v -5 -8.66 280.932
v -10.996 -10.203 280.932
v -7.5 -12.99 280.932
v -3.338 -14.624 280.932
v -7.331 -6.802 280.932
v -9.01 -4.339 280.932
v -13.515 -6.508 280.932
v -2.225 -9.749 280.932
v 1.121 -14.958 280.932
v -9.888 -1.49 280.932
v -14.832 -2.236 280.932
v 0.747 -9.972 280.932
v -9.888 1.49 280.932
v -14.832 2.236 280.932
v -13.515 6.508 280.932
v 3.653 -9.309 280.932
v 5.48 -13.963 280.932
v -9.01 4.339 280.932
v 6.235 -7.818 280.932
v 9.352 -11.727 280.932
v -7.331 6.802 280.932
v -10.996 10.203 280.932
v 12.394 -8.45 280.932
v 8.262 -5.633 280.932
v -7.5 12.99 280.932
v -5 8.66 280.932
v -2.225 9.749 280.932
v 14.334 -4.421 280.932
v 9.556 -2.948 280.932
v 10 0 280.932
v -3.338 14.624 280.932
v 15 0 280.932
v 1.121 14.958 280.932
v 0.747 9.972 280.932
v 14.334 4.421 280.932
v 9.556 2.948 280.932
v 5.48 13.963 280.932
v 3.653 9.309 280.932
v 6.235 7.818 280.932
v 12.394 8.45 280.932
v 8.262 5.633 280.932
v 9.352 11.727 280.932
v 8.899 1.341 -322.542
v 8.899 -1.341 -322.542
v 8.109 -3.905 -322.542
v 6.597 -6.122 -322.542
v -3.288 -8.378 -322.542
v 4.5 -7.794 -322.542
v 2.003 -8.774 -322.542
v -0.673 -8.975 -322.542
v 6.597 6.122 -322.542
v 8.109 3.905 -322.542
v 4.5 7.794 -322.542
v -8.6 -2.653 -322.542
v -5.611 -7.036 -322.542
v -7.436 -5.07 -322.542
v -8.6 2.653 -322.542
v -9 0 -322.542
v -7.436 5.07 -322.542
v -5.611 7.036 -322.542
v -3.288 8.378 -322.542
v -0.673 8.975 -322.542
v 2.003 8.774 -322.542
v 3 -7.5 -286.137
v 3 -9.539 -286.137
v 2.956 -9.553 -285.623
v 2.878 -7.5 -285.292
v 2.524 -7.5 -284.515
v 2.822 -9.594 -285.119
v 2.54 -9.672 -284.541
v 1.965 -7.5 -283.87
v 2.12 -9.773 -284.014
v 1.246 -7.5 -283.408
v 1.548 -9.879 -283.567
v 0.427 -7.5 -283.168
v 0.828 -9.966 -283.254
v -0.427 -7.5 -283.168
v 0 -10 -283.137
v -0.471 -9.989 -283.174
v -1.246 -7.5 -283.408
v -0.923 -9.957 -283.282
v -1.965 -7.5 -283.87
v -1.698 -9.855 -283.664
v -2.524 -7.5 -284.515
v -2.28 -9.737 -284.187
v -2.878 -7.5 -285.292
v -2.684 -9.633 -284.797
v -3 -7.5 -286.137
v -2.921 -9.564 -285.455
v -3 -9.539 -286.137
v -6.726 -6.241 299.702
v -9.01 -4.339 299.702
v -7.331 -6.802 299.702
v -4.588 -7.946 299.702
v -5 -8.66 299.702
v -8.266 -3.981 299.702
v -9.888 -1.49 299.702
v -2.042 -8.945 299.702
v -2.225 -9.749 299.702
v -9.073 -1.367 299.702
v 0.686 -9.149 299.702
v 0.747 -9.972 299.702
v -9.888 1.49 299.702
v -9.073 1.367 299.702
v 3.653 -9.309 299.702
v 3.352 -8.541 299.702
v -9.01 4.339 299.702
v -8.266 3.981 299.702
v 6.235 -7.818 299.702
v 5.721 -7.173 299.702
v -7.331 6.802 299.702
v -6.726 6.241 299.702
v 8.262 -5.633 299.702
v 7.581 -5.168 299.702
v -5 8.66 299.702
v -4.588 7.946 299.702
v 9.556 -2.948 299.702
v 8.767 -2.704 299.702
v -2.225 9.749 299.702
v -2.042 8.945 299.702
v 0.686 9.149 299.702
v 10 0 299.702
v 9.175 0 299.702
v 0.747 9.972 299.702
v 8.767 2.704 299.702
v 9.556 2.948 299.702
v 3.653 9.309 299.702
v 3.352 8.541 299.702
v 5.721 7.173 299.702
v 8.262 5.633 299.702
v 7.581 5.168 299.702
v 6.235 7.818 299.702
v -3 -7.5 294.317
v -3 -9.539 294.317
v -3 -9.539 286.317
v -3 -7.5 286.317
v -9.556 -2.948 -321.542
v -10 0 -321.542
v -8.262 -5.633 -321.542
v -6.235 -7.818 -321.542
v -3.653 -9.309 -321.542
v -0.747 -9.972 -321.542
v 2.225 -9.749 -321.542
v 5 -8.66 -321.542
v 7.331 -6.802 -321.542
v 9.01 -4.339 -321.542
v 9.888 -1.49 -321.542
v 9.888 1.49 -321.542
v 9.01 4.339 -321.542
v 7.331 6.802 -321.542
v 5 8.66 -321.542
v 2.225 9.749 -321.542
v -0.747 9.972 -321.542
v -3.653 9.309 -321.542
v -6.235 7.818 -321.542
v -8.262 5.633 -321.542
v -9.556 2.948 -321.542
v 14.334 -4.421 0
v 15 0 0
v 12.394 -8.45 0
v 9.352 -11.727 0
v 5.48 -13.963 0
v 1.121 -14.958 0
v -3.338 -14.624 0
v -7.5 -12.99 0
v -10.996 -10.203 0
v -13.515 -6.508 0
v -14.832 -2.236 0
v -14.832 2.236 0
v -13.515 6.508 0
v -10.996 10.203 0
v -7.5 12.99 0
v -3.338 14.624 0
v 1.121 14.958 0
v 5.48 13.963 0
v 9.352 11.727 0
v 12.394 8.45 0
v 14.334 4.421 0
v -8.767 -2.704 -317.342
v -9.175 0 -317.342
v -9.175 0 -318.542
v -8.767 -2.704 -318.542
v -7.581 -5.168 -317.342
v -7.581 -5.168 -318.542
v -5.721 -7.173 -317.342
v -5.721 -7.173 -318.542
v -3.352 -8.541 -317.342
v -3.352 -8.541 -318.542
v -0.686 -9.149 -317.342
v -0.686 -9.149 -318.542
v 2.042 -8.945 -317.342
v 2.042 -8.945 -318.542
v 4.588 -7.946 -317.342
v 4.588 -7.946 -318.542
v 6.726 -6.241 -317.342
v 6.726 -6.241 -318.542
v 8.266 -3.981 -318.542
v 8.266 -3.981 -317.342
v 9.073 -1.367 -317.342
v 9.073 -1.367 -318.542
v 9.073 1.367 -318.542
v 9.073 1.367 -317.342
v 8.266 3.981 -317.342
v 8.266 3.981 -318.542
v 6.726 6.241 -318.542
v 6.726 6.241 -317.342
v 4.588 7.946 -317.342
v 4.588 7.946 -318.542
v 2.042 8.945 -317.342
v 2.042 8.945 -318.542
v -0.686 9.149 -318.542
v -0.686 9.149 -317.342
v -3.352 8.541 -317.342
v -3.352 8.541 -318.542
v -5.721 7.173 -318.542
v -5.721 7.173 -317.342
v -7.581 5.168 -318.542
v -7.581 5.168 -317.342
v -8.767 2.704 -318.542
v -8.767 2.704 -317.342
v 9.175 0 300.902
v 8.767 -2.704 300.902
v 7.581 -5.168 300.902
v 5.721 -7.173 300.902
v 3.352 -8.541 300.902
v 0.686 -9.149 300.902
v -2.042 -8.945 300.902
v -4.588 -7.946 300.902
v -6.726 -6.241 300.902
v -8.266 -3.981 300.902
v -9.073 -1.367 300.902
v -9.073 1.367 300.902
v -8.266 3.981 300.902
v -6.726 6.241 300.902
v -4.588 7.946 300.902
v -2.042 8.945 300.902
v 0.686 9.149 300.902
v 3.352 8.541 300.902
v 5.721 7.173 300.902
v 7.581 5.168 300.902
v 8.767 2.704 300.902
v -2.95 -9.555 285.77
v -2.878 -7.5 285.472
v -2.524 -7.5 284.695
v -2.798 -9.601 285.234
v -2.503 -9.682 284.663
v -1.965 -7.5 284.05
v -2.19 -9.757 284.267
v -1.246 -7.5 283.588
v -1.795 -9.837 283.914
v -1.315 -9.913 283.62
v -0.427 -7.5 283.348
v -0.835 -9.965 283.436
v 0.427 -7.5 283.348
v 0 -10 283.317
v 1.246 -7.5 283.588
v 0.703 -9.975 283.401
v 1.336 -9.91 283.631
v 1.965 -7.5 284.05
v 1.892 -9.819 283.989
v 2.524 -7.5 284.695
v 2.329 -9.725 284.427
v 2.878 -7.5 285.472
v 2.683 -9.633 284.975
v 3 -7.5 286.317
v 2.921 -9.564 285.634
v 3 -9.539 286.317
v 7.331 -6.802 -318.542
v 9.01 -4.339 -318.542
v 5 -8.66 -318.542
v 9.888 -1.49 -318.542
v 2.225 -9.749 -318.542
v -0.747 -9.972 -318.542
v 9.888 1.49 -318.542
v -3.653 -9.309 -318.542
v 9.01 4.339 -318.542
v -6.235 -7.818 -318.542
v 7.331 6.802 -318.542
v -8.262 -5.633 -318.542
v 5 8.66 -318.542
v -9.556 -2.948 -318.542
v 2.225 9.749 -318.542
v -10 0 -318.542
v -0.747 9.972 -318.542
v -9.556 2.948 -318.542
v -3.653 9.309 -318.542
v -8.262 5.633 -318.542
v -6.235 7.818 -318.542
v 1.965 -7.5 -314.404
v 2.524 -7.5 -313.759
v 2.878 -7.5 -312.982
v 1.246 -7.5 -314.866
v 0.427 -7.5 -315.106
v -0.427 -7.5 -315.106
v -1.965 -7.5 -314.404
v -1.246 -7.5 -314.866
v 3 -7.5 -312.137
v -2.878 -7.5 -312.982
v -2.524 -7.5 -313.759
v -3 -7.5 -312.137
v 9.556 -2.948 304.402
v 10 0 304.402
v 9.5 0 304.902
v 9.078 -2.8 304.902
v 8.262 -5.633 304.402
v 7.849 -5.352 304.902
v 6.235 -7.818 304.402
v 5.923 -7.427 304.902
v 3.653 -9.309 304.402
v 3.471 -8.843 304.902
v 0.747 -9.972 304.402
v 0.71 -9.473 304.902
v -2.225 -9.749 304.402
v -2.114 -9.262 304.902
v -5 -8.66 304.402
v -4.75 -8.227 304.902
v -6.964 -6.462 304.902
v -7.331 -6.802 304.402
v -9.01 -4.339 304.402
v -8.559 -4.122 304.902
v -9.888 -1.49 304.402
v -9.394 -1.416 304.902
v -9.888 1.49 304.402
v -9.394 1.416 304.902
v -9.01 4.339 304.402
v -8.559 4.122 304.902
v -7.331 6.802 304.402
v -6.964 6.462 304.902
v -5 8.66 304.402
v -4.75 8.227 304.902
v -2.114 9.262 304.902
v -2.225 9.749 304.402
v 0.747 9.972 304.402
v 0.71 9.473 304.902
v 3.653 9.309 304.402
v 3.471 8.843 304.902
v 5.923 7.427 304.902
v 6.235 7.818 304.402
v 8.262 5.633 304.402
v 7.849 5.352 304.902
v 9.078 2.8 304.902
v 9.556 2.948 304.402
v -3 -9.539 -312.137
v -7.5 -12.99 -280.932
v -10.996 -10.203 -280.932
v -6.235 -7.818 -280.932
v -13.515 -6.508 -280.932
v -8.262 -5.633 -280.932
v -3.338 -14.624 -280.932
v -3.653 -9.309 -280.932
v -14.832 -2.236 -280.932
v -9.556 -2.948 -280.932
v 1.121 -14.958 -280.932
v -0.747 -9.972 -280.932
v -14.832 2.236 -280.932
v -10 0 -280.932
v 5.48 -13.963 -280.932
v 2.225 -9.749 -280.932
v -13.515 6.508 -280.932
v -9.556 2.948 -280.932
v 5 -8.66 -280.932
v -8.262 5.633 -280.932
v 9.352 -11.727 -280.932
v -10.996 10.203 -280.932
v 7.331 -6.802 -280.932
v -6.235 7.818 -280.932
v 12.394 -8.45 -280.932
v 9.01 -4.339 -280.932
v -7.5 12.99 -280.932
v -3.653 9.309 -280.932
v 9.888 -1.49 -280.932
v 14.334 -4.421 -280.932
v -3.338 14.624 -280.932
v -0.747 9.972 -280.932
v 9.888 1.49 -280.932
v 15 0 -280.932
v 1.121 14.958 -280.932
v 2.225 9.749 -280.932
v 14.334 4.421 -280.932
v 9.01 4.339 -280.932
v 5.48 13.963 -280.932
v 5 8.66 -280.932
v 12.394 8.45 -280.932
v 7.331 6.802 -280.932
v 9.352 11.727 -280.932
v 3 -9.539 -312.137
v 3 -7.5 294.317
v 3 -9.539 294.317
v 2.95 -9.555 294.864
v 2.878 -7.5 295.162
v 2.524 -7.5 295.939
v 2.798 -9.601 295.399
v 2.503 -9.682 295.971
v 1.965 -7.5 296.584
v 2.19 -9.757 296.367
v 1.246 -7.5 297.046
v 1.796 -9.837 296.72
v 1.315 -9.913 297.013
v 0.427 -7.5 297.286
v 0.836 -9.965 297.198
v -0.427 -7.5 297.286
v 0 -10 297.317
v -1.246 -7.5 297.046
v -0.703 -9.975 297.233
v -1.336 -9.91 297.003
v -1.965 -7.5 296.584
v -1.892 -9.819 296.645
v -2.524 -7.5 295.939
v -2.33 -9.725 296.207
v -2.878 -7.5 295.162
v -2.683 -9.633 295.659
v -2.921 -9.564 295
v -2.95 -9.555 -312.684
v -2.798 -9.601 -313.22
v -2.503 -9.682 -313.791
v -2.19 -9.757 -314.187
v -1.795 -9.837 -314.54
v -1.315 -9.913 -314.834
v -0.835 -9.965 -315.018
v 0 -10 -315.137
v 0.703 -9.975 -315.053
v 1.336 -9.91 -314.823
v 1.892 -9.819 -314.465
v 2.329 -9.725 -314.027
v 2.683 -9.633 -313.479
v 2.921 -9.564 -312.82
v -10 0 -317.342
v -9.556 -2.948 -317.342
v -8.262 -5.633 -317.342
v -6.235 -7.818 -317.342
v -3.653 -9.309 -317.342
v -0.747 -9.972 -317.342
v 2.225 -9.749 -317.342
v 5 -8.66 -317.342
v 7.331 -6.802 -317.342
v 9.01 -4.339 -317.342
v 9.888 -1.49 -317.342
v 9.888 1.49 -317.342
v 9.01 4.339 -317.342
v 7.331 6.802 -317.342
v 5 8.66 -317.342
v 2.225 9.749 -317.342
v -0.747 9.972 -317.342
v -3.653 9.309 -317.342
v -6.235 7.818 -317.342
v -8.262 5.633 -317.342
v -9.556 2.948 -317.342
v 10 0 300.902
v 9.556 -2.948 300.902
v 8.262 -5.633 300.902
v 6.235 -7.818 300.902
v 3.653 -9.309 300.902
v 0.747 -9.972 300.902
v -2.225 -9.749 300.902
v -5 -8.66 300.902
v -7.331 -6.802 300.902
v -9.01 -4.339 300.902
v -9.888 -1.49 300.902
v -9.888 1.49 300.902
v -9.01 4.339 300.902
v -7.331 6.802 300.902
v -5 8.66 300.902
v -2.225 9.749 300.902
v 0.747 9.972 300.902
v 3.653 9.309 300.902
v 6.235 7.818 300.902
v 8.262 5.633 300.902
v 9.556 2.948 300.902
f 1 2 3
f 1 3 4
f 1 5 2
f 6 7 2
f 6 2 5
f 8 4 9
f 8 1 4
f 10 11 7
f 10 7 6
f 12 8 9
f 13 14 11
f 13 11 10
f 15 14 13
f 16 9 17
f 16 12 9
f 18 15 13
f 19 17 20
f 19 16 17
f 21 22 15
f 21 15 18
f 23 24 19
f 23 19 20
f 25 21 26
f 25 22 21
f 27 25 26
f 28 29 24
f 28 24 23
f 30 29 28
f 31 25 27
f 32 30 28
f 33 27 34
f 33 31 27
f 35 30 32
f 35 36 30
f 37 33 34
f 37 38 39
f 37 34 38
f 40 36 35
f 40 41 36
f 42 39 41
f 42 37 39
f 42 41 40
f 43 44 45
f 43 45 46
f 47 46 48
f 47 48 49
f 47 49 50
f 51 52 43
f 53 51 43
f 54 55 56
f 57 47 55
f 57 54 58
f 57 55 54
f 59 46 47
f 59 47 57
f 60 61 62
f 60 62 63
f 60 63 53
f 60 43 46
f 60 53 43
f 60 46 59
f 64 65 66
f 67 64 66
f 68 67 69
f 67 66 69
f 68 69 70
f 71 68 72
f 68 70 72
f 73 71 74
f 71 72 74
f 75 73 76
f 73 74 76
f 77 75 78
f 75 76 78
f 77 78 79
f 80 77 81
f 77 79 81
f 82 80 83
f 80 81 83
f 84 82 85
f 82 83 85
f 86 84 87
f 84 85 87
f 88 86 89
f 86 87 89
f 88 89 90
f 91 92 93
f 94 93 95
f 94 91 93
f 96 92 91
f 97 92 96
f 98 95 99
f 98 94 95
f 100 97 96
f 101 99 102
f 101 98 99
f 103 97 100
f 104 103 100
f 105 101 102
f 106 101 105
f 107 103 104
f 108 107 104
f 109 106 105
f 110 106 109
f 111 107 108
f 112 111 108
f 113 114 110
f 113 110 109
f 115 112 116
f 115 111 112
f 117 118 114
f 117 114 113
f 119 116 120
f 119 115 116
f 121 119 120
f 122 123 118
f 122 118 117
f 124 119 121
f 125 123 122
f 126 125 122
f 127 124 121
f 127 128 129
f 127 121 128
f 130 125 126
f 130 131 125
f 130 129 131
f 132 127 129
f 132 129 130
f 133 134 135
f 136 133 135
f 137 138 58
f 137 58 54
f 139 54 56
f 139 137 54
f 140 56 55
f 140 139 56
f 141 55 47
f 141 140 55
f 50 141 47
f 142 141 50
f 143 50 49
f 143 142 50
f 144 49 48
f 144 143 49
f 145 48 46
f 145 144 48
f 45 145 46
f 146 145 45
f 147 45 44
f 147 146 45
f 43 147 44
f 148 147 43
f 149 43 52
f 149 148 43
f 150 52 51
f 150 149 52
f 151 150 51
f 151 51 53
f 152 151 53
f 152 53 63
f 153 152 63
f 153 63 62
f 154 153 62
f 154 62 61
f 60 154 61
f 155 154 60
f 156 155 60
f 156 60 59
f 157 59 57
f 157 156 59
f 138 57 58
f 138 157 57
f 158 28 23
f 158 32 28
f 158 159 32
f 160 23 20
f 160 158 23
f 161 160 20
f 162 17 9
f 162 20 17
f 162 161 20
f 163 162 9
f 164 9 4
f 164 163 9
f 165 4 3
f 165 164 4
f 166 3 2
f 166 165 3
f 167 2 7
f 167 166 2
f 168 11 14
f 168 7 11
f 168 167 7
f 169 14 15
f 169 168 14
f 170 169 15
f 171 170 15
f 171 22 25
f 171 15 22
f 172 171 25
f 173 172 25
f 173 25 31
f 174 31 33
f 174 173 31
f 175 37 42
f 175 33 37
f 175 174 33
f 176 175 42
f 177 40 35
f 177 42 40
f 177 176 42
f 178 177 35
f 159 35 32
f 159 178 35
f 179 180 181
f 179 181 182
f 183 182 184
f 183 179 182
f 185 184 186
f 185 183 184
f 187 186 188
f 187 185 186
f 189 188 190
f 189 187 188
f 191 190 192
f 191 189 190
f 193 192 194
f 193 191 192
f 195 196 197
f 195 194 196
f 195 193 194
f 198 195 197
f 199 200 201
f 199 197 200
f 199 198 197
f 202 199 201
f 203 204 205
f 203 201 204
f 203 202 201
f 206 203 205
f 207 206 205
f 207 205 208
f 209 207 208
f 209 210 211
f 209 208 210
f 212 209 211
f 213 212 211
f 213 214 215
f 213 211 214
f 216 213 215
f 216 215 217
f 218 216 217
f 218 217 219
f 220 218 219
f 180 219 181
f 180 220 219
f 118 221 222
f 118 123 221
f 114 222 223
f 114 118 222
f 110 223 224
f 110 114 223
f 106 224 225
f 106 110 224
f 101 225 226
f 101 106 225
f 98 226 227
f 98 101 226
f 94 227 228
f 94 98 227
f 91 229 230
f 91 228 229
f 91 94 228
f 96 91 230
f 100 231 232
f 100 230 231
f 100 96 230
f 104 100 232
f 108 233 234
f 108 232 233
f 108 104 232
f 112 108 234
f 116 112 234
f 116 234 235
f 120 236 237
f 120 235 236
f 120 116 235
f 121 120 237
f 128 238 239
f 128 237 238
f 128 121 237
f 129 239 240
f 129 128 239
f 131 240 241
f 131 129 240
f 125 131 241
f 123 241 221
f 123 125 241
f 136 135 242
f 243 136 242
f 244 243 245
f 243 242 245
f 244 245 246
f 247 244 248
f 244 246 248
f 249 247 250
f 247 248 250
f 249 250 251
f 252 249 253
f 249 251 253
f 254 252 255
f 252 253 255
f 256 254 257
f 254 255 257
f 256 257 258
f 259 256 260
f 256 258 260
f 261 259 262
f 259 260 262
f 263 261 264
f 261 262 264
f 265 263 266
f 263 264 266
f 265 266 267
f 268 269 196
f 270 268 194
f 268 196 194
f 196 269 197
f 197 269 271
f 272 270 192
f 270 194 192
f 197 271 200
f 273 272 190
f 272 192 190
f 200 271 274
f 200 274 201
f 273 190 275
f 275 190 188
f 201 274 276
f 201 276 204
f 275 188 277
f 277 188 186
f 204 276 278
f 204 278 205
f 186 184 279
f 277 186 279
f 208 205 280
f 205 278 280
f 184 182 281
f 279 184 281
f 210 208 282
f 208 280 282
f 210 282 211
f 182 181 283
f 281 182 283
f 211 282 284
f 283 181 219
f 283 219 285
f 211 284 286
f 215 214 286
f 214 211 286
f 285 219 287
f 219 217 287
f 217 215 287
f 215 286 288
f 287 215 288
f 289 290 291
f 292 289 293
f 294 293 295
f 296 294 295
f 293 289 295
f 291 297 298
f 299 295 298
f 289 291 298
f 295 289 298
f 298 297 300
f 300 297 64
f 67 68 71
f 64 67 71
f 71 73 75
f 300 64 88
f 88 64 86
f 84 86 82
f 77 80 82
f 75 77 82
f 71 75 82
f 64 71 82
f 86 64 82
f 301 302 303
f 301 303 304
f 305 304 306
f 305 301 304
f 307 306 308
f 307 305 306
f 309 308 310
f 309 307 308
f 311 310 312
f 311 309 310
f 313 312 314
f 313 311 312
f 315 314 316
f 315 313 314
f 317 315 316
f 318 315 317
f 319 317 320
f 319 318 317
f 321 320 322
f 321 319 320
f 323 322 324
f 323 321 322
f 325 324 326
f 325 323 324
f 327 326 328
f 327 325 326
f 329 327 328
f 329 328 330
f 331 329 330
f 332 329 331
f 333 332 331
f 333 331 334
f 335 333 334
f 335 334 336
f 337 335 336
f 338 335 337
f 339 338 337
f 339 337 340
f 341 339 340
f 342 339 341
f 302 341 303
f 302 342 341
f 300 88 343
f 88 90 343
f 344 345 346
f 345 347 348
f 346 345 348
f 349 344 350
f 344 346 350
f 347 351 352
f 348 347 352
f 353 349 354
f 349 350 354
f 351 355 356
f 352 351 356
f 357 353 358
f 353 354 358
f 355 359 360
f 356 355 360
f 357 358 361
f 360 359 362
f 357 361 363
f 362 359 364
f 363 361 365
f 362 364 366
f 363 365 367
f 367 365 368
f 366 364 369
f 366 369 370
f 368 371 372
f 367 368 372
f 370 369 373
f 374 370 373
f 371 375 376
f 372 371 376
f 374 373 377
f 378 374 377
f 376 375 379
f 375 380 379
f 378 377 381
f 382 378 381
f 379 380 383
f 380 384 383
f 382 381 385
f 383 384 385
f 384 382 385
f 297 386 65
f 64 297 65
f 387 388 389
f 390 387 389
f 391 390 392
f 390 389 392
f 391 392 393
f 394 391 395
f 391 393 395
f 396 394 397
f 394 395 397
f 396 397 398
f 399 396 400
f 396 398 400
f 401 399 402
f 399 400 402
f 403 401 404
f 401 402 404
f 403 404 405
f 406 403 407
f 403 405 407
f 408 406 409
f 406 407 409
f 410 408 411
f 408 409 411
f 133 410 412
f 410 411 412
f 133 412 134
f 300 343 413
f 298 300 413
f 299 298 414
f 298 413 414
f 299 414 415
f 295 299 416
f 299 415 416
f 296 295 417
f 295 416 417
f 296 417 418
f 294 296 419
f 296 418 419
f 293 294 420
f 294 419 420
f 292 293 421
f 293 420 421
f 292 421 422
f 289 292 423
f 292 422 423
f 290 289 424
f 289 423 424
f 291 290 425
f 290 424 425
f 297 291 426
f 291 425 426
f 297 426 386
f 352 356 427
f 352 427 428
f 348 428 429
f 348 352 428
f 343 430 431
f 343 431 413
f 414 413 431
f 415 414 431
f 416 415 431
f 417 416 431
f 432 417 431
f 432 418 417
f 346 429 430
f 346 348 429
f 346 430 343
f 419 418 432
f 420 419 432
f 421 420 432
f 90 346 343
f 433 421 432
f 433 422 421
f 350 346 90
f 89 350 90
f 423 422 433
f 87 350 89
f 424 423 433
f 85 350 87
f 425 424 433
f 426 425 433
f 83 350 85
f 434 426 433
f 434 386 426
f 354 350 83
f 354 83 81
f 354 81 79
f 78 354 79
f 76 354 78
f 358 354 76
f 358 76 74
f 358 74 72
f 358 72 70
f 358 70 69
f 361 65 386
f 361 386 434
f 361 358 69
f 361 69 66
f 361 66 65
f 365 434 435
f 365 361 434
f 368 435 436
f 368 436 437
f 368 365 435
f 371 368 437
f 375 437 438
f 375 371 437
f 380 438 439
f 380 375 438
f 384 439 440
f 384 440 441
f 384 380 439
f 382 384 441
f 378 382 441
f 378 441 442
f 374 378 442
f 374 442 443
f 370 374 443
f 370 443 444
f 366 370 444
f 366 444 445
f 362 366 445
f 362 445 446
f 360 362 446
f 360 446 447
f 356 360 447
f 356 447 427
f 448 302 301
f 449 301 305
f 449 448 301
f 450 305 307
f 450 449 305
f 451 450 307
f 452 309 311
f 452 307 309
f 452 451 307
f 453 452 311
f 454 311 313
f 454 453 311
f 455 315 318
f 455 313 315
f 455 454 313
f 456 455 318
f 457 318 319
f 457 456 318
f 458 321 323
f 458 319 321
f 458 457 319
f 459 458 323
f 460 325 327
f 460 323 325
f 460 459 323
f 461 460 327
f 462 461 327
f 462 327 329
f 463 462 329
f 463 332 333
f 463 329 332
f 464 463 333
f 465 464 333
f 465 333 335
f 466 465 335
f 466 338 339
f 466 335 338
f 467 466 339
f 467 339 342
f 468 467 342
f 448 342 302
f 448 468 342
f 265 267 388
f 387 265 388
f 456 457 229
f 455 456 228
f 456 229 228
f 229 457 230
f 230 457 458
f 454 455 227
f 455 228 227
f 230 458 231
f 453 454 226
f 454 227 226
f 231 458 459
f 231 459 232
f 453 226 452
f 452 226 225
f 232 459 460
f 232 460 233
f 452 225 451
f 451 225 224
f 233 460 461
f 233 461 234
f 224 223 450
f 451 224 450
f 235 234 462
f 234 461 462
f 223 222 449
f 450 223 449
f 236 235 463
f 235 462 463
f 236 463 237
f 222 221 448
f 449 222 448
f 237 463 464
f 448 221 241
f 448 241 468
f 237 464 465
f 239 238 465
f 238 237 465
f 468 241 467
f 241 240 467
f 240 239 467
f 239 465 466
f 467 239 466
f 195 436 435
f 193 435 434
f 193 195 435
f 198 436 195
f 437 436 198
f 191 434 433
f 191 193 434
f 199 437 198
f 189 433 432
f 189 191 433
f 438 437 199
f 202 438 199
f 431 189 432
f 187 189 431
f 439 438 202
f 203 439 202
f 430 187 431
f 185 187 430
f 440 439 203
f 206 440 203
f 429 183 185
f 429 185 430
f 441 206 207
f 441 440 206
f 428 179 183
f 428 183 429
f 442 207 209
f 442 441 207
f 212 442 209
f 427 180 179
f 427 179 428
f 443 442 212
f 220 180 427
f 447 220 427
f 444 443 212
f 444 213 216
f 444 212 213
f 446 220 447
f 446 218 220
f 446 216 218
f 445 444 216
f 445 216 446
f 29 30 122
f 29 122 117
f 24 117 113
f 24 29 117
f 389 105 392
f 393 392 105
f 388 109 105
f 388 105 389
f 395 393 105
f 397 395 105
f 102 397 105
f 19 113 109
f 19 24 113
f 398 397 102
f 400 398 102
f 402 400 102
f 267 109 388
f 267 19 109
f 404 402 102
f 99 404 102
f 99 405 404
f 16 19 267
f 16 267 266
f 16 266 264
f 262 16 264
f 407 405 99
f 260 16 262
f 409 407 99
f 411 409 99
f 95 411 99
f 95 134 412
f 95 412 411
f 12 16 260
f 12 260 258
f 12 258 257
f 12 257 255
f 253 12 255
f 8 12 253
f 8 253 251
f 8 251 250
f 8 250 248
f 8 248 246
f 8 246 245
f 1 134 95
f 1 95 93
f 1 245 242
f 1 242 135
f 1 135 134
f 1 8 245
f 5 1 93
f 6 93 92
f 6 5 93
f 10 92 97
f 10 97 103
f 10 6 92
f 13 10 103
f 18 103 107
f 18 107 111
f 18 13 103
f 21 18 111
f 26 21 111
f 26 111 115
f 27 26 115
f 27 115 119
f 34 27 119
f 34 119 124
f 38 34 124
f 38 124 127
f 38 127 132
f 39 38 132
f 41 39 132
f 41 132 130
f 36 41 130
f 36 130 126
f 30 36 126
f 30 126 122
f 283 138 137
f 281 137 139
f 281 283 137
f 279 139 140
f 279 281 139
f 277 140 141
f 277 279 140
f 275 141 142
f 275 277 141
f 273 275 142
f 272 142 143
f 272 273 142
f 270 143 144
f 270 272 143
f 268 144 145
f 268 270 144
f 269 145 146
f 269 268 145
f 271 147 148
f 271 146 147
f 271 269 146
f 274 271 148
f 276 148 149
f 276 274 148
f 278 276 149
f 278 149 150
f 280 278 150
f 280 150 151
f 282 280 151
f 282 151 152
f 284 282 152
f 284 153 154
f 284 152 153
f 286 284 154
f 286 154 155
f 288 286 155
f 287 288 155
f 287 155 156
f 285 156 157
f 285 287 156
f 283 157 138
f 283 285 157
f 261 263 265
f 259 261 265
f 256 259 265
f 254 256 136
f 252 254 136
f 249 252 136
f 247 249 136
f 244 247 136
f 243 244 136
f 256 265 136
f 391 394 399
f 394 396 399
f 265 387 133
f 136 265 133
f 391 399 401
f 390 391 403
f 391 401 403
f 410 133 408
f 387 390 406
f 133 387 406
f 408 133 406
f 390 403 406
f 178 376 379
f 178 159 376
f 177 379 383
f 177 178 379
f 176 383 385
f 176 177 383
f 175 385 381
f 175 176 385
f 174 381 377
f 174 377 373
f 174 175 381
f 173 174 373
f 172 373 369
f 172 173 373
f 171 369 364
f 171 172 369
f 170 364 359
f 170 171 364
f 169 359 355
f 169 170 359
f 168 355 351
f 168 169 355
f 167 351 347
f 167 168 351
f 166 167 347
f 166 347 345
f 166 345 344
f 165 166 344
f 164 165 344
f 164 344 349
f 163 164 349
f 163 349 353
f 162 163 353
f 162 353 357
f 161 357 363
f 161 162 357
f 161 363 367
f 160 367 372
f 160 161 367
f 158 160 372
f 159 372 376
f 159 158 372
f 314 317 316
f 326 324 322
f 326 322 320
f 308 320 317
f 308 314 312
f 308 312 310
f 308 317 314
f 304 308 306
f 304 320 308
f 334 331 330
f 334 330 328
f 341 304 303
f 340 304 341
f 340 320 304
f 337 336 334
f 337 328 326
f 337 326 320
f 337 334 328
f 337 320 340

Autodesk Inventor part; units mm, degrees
ref_plane "YZ Plane" through (0, 0, 0) normal (1, 0, 0) x (0, 1, 0)
ref_plane "XY Plane" through (0, 0, 0) normal (0, 0, 1) x (1, 0, 0)
sketch "草图1" plane through (0, 0, 0) normal (0, 0, 1) x (1, 0, 0)
  circle A0 centre (0, 0) radius 15
  dimension "d0" = 30
extrude "拉伸1" add sketch "草图1" along normal mid plane 561.864
sketch "草图2" plane through (0, 0, 280.932) normal (0, 0, 1) x (1, 0, 0)
  circle A0 centre (0, 0) radius 10
  dimension "d3" = 20
extrude "拉伸2" add sketch "草图2" along normal blind 23.97
ref_plane "工作平面1" through (0, -10, 280.932) normal (0, 1, 0) x (-1, 0, 0)
sketch "草图3" plane through (0, -10, 280.932) normal (0, 1, 0) x (-1, 0, 0)
  line L0 (-3, 13.385) -> (3, 13.385)
  line L1 (3, 13.385) -> (3, 5.385)
  line L2 (3, 5.385) -> (-3, 5.385)
  line L3 (-3, 5.385) -> (-3, 13.385)
  arc A0 (3, 13.385) -> (-3, 13.385) centre (0, 13.385) ccw
  arc A1 (-3, 5.385) -> (3, 5.385) centre (0, 5.385) ccw
  line L4 (15, 0) -> (-15, 0) projected
  line L5 (0, 0) -> (0, 30.5075)
  point P0 (0, -280.932)
  dimension "d6" = 30.5075
  dimension "d7" = 6
  dimension "d8" = 8
  dimension "d9" = 5.385
extrude "拉伸3" cut sketch "草图3" along normal blind 2.5
sketch "草图4" plane through (0, 0, 0) normal (0, 1, 0) x (-1, 0, 0)
  line L0 (-9.175, 299.702) -> (-11.2925, 299.702)
  line L1 (-11.2925, 299.702) -> (-11.2925, 300.902)
  line L2 (-11.2925, 300.902) -> (-9.175, 300.902)
  line L3 (-9.175, 300.902) -> (-9.175, 299.702)
  line L4 (0, 0) -> (0, 472.2352)
  line L5 (10, 304.902) -> (-10, 304.902) projected
  line L6 (0, -94.447) -> (0, 566.6823) projected
  dimension "d12" = 472.2352
  dimension "d13" = 9.175
  dimension "d14" = 1.2
  dimension "d15" = 4
  dimension "d16" = 2.1175
revolve "旋转1" cut sketch "草图4" angle 360 about axis through (0, 0, -10) along (0, 0, 1)
chamfer "倒角1" distance 0.5 angle 45 1 edges at (-10, 0, 304.902)
sketch "草图5" plane through (0, 0, -280.932) normal (0, 0, -1) x (-1, 0, 0)
  circle A0 centre (0, 0) radius 10
  dimension "d21" = 20
extrude "拉伸4" add sketch "草图5" along normal blind 41.61
sketch "草图6" plane through (0, -10, 280.932) normal (0, 1, 0) x (-1, 0, 0)
  line L0 (3, -593.069) -> (-3, -593.069)
  line L1 (-3, -593.069) -> (-3, -567.069)
  line L2 (-3, -567.069) -> (3, -567.069)
  line L3 (3, -567.069) -> (3, -593.069)
  arc A0 (-3, -593.069) -> (3, -593.069) centre (0, -593.069) ccw
  arc A1 (3, -567.069) -> (-3, -567.069) centre (0, -567.069) ccw
  line L4 (-10, -603.474) -> (10, -603.474) projected
  line L5 (0, -603.474) -> (0, -655.1956)
  line L6 (-15, -561.864) -> (15, -561.864) projected
  point P0 (0, -280.932)
  dimension "d24" = 6
  dimension "d25" = 26
  dimension "d26" = 5.205
extrude "拉伸5" cut sketch "草图6" along normal blind 2.5
sketch "草图7" plane through (0, 0, 0) normal (0, 1, 0) x (-1, 0, 0)
  line L0 (14.9872, -318.542) -> (9.175, -318.542)
  line L1 (9.175, -318.542) -> (9.175, -317.342)
  line L2 (9.175, -317.342) -> (14.9872, -317.342)
  line L3 (14.9872, -317.342) -> (14.9872, -318.542)
  line L4 (-10, -322.542) -> (10, -322.542) projected
  line L5 (0, -322.542) -> (0, -326.842)
  point P0 (0, 0)
  dimension "d29" = 4.3
  dimension "d30" = 1.2
  dimension "d31" = 5.8122
  dimension "d32" = 4
  dimension "d33" = 9.175
revolve "旋转2" cut sketch "草图7" angle 360 about axis through (0, 0, -322.542) along (0, 0, -1)
chamfer "倒角2" distance 1 angle 45 1 edges at (10, 0, -322.542)
properties part number "中间传动轴"
